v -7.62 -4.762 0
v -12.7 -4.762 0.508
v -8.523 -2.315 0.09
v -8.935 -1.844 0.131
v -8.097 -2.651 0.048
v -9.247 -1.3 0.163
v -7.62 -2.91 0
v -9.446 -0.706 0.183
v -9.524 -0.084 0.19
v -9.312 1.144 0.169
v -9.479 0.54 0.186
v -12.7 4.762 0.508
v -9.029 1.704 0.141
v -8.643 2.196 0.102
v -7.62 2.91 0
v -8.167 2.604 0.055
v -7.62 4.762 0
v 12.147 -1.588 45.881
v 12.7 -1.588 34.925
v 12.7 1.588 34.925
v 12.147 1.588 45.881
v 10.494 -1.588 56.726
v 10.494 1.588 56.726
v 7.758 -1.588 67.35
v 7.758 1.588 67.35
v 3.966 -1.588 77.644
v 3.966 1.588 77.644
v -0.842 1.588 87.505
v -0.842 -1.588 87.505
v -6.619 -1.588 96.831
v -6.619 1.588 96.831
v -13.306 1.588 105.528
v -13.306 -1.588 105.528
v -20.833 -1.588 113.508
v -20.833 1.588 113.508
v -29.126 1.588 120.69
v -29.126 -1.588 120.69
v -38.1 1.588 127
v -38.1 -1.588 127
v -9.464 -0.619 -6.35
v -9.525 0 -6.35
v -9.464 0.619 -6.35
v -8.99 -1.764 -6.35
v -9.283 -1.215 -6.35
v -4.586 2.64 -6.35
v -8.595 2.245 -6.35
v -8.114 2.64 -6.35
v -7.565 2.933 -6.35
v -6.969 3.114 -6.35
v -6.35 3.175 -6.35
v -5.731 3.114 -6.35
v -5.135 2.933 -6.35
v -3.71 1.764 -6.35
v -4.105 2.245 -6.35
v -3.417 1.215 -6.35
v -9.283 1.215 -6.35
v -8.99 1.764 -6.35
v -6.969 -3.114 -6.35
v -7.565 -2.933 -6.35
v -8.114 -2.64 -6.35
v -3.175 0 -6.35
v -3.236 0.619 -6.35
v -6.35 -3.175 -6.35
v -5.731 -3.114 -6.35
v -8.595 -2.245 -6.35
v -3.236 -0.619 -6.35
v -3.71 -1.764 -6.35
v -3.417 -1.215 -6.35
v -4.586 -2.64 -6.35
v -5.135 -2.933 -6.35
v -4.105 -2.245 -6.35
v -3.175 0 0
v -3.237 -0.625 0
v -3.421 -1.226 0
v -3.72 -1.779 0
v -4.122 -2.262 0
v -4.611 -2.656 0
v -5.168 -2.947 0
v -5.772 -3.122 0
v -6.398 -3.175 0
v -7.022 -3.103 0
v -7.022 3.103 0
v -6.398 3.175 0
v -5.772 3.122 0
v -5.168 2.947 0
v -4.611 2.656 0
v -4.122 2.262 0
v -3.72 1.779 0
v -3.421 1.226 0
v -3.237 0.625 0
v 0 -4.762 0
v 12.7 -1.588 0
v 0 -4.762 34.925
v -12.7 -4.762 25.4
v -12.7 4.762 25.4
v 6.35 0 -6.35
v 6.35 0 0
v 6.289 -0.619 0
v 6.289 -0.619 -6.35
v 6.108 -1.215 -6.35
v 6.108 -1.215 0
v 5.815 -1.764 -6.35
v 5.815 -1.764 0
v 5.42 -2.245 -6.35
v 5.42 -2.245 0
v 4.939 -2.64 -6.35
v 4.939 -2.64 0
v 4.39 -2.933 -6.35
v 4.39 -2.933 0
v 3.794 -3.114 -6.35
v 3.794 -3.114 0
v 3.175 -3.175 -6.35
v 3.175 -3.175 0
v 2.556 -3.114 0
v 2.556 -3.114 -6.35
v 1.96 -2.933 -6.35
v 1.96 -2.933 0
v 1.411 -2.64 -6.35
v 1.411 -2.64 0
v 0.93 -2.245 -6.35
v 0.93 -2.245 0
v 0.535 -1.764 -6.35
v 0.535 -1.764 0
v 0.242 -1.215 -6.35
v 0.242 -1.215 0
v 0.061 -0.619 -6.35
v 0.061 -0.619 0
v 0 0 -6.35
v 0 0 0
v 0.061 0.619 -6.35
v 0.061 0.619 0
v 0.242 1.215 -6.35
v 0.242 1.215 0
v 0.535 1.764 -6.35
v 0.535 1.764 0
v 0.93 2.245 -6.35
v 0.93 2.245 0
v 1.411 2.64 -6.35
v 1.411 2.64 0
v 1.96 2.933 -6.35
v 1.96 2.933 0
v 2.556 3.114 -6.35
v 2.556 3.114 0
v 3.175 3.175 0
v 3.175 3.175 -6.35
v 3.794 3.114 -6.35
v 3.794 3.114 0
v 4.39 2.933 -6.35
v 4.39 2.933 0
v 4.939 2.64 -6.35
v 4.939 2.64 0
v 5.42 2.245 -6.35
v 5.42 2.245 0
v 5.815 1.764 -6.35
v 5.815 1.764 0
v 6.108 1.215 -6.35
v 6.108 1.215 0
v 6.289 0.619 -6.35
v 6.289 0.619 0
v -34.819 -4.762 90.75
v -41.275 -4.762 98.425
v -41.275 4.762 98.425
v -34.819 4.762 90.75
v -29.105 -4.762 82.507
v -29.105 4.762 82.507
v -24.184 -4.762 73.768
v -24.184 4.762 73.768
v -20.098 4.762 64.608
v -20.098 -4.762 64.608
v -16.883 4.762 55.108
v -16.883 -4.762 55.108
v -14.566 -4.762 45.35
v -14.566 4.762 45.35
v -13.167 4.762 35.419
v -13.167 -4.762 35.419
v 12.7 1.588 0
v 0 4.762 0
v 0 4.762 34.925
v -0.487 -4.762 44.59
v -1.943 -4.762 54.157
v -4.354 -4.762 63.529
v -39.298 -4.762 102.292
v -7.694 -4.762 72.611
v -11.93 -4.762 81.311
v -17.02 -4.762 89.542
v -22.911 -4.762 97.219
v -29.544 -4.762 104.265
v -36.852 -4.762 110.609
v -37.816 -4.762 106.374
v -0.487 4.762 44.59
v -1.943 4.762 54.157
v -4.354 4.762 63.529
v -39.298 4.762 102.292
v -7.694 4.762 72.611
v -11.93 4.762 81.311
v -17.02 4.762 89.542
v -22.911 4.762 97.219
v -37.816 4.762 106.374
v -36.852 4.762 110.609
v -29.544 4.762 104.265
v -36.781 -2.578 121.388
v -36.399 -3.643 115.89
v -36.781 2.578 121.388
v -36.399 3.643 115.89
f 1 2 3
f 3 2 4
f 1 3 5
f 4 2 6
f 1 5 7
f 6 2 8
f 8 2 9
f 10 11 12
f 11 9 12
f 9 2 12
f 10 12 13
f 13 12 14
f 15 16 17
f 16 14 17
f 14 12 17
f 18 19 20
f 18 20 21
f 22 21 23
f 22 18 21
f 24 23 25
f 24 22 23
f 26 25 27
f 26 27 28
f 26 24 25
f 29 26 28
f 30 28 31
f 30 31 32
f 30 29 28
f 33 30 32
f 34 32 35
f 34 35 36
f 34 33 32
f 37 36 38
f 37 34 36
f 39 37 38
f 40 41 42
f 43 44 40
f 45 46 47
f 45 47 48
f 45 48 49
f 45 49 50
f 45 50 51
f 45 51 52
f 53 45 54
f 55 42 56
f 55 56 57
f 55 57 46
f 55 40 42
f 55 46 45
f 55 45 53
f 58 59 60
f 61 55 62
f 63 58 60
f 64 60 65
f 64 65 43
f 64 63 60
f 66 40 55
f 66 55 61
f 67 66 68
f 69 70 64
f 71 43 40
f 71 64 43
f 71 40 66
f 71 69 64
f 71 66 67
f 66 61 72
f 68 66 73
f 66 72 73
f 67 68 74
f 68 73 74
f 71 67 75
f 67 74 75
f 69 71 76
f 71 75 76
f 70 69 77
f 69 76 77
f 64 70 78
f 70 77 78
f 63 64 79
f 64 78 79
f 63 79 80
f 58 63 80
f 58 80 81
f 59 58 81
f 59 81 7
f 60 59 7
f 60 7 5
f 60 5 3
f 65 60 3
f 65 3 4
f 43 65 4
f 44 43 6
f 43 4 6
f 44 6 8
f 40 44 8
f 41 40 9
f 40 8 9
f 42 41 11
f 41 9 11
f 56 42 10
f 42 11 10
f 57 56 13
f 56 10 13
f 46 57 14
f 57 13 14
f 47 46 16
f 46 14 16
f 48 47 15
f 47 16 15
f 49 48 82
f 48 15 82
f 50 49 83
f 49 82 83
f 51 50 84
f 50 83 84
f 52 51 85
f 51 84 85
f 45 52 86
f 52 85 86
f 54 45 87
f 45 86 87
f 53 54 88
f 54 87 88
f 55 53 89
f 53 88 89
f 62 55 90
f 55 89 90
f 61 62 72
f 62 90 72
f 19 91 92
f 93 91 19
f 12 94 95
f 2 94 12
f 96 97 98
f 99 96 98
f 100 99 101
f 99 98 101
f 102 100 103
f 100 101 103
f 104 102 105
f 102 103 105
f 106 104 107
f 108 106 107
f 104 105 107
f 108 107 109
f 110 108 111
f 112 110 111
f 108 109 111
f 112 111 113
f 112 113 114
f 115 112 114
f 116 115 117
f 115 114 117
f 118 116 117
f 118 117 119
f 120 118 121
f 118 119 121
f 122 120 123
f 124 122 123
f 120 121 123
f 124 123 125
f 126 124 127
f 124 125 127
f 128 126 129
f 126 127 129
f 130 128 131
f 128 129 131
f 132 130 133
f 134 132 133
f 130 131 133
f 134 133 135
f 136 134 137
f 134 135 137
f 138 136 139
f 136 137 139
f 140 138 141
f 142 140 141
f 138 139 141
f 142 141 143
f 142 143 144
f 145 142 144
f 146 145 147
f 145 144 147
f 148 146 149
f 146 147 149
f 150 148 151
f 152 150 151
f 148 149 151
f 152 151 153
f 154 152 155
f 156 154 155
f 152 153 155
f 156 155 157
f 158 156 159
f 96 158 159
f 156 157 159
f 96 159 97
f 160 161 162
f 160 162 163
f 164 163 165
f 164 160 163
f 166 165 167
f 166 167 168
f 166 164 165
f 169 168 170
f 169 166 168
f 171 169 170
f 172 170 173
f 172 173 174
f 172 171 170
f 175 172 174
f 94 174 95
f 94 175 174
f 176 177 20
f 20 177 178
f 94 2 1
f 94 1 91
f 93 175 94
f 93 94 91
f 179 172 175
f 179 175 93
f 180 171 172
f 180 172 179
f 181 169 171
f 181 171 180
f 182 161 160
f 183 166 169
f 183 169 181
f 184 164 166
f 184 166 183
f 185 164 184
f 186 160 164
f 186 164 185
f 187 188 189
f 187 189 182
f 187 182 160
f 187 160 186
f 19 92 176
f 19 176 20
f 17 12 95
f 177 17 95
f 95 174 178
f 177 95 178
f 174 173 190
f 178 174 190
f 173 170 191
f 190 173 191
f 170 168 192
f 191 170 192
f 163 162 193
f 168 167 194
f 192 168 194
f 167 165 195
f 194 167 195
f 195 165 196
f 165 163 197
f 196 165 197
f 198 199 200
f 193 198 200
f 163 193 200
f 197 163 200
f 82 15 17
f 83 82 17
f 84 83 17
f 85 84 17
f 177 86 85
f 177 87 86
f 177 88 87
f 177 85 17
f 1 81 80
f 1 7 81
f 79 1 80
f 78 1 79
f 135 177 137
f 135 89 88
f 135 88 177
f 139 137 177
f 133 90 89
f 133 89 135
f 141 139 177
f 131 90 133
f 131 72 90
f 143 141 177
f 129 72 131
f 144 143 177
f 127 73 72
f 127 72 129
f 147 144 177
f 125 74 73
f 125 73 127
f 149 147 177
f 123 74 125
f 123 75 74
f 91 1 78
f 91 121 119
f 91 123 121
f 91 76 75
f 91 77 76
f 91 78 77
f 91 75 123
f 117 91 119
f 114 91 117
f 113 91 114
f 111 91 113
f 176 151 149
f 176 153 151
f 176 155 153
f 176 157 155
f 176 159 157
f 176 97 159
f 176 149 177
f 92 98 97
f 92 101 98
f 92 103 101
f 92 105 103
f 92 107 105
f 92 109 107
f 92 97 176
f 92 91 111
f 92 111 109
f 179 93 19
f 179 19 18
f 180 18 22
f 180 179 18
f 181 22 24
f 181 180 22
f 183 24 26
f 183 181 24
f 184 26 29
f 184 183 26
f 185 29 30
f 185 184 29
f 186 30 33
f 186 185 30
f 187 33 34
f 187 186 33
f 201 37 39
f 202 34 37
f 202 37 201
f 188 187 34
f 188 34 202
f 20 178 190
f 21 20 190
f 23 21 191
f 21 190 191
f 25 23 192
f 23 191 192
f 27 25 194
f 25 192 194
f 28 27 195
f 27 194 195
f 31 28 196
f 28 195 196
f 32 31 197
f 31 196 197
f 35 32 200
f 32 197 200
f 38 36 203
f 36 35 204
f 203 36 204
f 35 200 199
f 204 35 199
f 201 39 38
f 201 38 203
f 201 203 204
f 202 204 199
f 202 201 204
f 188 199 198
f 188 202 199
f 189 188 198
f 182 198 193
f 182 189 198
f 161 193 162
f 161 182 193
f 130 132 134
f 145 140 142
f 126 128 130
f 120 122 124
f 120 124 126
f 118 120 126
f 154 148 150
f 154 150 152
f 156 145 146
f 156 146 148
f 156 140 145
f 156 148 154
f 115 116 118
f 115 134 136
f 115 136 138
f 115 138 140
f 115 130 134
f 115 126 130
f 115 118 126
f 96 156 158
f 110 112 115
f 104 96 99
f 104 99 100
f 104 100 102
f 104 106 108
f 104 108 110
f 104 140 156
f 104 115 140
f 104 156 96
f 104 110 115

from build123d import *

# Parameters (mm, degrees)
F1_DEPTH    = 4.7625
F2_SIZE2    = 12.7
F2_SIZE     = 3.175
F3_SIZE2    = 12.7
F3_SIZE     = 3.175
F4_R        = 3.175
F5_DEPTH    = 6.35
F6_T4_DEPTH = 35.9361512716
F6_S5_R     = 3.175
F6_T6_DEPTH = 20


# Not quite as in the source:
# - a fillet or chamfer that OpenCascade refuses, or shapes differently, is made with other operations: its cross-section is extruded or revolved along the edge and cut away or added


with BuildPart() as f1:
    # F0 (on Front) → F1 (new body, symmetric)
    with BuildSketch(Plane.XZ):
        with BuildLine():
            ThreePointArc((-38.1, 127), (-36.6107102977, 112.3706344775), (-41.275, 98.425))
            ThreePointArc((-41.275, 98.425), (-20.0980859114, 64.6083576869), (-12.7, 25.4))
            Line((-12.7, 25.4), (-12.7, 0))
            Line((-12.7, 0), (12.7, 0))
            Line((12.7, 0), (12.7, 34.925))
            ThreePointArc((12.7, 34.925), (-0.8424942493, 87.5045721383), (-38.1, 127))
        make_face()
    extrude(amount=F1_DEPTH, both=True)

    # F2
    f2_edges = [f1.edges().sort_by_distance(p)[0] for p in [
        (-0.842494, -4.7625, 87.504572),
        (12.7, -4.7625, 17.4625),
    ]]
    chamfer(f2_edges, length=F2_SIZE, length2=F2_SIZE2)

    # F3
    f3_edges = [f1.edges().sort_by_distance(p)[0] for p in [
        (-0.842494, 4.7625, 87.504572),
    ]]
    f3_side = f1.faces().sort_by_distance((-0.842494, 1.5875, 87.504572))[0]
    chamfer(f3_edges, length=F3_SIZE, length2=F3_SIZE2, reference=f3_side)

    # F4 (on face) → F5 (join)
    with BuildSketch(Plane(origin=(0, 0, 0), x_dir=(1, 0, 0), z_dir=(0, 0, -1))):
        with Locations((-6.35, 0)):
            Circle(F4_R)
        with Locations((3.175, 0)):
            Circle(F4_R)
    extrude(amount=F5_DEPTH)

    # F6: chamfer of 0.508 x 5.08 on 1 edges, made by hand


with BuildPart() as f6_tool2:
    # F6_s3 → F6_t4 (new body)
    with BuildSketch(Plane.XZ.offset(-17.9680756358)):
        Polygon((-12.7, 0.508), (-7.62, 0), (-12.7, 0), align=None)
    extrude(amount=F6_T4_DEPTH)

    # F6_s5 → F6_t6 (cut, symmetric)
    with BuildSketch(Plane.XY.offset(0.3)):
        with Locations((-6.35, 0)):
            Circle(F6_S5_R)
    extrude(amount=F6_T6_DEPTH, both=True, mode=Mode.SUBTRACT)


with BuildPart() as f1_1:
    add(f1.part)

    # F6_t1: cut F6_tool2
    add(f6_tool2.part, mode=Mode.SUBTRACT)


solid = f1_1.part
